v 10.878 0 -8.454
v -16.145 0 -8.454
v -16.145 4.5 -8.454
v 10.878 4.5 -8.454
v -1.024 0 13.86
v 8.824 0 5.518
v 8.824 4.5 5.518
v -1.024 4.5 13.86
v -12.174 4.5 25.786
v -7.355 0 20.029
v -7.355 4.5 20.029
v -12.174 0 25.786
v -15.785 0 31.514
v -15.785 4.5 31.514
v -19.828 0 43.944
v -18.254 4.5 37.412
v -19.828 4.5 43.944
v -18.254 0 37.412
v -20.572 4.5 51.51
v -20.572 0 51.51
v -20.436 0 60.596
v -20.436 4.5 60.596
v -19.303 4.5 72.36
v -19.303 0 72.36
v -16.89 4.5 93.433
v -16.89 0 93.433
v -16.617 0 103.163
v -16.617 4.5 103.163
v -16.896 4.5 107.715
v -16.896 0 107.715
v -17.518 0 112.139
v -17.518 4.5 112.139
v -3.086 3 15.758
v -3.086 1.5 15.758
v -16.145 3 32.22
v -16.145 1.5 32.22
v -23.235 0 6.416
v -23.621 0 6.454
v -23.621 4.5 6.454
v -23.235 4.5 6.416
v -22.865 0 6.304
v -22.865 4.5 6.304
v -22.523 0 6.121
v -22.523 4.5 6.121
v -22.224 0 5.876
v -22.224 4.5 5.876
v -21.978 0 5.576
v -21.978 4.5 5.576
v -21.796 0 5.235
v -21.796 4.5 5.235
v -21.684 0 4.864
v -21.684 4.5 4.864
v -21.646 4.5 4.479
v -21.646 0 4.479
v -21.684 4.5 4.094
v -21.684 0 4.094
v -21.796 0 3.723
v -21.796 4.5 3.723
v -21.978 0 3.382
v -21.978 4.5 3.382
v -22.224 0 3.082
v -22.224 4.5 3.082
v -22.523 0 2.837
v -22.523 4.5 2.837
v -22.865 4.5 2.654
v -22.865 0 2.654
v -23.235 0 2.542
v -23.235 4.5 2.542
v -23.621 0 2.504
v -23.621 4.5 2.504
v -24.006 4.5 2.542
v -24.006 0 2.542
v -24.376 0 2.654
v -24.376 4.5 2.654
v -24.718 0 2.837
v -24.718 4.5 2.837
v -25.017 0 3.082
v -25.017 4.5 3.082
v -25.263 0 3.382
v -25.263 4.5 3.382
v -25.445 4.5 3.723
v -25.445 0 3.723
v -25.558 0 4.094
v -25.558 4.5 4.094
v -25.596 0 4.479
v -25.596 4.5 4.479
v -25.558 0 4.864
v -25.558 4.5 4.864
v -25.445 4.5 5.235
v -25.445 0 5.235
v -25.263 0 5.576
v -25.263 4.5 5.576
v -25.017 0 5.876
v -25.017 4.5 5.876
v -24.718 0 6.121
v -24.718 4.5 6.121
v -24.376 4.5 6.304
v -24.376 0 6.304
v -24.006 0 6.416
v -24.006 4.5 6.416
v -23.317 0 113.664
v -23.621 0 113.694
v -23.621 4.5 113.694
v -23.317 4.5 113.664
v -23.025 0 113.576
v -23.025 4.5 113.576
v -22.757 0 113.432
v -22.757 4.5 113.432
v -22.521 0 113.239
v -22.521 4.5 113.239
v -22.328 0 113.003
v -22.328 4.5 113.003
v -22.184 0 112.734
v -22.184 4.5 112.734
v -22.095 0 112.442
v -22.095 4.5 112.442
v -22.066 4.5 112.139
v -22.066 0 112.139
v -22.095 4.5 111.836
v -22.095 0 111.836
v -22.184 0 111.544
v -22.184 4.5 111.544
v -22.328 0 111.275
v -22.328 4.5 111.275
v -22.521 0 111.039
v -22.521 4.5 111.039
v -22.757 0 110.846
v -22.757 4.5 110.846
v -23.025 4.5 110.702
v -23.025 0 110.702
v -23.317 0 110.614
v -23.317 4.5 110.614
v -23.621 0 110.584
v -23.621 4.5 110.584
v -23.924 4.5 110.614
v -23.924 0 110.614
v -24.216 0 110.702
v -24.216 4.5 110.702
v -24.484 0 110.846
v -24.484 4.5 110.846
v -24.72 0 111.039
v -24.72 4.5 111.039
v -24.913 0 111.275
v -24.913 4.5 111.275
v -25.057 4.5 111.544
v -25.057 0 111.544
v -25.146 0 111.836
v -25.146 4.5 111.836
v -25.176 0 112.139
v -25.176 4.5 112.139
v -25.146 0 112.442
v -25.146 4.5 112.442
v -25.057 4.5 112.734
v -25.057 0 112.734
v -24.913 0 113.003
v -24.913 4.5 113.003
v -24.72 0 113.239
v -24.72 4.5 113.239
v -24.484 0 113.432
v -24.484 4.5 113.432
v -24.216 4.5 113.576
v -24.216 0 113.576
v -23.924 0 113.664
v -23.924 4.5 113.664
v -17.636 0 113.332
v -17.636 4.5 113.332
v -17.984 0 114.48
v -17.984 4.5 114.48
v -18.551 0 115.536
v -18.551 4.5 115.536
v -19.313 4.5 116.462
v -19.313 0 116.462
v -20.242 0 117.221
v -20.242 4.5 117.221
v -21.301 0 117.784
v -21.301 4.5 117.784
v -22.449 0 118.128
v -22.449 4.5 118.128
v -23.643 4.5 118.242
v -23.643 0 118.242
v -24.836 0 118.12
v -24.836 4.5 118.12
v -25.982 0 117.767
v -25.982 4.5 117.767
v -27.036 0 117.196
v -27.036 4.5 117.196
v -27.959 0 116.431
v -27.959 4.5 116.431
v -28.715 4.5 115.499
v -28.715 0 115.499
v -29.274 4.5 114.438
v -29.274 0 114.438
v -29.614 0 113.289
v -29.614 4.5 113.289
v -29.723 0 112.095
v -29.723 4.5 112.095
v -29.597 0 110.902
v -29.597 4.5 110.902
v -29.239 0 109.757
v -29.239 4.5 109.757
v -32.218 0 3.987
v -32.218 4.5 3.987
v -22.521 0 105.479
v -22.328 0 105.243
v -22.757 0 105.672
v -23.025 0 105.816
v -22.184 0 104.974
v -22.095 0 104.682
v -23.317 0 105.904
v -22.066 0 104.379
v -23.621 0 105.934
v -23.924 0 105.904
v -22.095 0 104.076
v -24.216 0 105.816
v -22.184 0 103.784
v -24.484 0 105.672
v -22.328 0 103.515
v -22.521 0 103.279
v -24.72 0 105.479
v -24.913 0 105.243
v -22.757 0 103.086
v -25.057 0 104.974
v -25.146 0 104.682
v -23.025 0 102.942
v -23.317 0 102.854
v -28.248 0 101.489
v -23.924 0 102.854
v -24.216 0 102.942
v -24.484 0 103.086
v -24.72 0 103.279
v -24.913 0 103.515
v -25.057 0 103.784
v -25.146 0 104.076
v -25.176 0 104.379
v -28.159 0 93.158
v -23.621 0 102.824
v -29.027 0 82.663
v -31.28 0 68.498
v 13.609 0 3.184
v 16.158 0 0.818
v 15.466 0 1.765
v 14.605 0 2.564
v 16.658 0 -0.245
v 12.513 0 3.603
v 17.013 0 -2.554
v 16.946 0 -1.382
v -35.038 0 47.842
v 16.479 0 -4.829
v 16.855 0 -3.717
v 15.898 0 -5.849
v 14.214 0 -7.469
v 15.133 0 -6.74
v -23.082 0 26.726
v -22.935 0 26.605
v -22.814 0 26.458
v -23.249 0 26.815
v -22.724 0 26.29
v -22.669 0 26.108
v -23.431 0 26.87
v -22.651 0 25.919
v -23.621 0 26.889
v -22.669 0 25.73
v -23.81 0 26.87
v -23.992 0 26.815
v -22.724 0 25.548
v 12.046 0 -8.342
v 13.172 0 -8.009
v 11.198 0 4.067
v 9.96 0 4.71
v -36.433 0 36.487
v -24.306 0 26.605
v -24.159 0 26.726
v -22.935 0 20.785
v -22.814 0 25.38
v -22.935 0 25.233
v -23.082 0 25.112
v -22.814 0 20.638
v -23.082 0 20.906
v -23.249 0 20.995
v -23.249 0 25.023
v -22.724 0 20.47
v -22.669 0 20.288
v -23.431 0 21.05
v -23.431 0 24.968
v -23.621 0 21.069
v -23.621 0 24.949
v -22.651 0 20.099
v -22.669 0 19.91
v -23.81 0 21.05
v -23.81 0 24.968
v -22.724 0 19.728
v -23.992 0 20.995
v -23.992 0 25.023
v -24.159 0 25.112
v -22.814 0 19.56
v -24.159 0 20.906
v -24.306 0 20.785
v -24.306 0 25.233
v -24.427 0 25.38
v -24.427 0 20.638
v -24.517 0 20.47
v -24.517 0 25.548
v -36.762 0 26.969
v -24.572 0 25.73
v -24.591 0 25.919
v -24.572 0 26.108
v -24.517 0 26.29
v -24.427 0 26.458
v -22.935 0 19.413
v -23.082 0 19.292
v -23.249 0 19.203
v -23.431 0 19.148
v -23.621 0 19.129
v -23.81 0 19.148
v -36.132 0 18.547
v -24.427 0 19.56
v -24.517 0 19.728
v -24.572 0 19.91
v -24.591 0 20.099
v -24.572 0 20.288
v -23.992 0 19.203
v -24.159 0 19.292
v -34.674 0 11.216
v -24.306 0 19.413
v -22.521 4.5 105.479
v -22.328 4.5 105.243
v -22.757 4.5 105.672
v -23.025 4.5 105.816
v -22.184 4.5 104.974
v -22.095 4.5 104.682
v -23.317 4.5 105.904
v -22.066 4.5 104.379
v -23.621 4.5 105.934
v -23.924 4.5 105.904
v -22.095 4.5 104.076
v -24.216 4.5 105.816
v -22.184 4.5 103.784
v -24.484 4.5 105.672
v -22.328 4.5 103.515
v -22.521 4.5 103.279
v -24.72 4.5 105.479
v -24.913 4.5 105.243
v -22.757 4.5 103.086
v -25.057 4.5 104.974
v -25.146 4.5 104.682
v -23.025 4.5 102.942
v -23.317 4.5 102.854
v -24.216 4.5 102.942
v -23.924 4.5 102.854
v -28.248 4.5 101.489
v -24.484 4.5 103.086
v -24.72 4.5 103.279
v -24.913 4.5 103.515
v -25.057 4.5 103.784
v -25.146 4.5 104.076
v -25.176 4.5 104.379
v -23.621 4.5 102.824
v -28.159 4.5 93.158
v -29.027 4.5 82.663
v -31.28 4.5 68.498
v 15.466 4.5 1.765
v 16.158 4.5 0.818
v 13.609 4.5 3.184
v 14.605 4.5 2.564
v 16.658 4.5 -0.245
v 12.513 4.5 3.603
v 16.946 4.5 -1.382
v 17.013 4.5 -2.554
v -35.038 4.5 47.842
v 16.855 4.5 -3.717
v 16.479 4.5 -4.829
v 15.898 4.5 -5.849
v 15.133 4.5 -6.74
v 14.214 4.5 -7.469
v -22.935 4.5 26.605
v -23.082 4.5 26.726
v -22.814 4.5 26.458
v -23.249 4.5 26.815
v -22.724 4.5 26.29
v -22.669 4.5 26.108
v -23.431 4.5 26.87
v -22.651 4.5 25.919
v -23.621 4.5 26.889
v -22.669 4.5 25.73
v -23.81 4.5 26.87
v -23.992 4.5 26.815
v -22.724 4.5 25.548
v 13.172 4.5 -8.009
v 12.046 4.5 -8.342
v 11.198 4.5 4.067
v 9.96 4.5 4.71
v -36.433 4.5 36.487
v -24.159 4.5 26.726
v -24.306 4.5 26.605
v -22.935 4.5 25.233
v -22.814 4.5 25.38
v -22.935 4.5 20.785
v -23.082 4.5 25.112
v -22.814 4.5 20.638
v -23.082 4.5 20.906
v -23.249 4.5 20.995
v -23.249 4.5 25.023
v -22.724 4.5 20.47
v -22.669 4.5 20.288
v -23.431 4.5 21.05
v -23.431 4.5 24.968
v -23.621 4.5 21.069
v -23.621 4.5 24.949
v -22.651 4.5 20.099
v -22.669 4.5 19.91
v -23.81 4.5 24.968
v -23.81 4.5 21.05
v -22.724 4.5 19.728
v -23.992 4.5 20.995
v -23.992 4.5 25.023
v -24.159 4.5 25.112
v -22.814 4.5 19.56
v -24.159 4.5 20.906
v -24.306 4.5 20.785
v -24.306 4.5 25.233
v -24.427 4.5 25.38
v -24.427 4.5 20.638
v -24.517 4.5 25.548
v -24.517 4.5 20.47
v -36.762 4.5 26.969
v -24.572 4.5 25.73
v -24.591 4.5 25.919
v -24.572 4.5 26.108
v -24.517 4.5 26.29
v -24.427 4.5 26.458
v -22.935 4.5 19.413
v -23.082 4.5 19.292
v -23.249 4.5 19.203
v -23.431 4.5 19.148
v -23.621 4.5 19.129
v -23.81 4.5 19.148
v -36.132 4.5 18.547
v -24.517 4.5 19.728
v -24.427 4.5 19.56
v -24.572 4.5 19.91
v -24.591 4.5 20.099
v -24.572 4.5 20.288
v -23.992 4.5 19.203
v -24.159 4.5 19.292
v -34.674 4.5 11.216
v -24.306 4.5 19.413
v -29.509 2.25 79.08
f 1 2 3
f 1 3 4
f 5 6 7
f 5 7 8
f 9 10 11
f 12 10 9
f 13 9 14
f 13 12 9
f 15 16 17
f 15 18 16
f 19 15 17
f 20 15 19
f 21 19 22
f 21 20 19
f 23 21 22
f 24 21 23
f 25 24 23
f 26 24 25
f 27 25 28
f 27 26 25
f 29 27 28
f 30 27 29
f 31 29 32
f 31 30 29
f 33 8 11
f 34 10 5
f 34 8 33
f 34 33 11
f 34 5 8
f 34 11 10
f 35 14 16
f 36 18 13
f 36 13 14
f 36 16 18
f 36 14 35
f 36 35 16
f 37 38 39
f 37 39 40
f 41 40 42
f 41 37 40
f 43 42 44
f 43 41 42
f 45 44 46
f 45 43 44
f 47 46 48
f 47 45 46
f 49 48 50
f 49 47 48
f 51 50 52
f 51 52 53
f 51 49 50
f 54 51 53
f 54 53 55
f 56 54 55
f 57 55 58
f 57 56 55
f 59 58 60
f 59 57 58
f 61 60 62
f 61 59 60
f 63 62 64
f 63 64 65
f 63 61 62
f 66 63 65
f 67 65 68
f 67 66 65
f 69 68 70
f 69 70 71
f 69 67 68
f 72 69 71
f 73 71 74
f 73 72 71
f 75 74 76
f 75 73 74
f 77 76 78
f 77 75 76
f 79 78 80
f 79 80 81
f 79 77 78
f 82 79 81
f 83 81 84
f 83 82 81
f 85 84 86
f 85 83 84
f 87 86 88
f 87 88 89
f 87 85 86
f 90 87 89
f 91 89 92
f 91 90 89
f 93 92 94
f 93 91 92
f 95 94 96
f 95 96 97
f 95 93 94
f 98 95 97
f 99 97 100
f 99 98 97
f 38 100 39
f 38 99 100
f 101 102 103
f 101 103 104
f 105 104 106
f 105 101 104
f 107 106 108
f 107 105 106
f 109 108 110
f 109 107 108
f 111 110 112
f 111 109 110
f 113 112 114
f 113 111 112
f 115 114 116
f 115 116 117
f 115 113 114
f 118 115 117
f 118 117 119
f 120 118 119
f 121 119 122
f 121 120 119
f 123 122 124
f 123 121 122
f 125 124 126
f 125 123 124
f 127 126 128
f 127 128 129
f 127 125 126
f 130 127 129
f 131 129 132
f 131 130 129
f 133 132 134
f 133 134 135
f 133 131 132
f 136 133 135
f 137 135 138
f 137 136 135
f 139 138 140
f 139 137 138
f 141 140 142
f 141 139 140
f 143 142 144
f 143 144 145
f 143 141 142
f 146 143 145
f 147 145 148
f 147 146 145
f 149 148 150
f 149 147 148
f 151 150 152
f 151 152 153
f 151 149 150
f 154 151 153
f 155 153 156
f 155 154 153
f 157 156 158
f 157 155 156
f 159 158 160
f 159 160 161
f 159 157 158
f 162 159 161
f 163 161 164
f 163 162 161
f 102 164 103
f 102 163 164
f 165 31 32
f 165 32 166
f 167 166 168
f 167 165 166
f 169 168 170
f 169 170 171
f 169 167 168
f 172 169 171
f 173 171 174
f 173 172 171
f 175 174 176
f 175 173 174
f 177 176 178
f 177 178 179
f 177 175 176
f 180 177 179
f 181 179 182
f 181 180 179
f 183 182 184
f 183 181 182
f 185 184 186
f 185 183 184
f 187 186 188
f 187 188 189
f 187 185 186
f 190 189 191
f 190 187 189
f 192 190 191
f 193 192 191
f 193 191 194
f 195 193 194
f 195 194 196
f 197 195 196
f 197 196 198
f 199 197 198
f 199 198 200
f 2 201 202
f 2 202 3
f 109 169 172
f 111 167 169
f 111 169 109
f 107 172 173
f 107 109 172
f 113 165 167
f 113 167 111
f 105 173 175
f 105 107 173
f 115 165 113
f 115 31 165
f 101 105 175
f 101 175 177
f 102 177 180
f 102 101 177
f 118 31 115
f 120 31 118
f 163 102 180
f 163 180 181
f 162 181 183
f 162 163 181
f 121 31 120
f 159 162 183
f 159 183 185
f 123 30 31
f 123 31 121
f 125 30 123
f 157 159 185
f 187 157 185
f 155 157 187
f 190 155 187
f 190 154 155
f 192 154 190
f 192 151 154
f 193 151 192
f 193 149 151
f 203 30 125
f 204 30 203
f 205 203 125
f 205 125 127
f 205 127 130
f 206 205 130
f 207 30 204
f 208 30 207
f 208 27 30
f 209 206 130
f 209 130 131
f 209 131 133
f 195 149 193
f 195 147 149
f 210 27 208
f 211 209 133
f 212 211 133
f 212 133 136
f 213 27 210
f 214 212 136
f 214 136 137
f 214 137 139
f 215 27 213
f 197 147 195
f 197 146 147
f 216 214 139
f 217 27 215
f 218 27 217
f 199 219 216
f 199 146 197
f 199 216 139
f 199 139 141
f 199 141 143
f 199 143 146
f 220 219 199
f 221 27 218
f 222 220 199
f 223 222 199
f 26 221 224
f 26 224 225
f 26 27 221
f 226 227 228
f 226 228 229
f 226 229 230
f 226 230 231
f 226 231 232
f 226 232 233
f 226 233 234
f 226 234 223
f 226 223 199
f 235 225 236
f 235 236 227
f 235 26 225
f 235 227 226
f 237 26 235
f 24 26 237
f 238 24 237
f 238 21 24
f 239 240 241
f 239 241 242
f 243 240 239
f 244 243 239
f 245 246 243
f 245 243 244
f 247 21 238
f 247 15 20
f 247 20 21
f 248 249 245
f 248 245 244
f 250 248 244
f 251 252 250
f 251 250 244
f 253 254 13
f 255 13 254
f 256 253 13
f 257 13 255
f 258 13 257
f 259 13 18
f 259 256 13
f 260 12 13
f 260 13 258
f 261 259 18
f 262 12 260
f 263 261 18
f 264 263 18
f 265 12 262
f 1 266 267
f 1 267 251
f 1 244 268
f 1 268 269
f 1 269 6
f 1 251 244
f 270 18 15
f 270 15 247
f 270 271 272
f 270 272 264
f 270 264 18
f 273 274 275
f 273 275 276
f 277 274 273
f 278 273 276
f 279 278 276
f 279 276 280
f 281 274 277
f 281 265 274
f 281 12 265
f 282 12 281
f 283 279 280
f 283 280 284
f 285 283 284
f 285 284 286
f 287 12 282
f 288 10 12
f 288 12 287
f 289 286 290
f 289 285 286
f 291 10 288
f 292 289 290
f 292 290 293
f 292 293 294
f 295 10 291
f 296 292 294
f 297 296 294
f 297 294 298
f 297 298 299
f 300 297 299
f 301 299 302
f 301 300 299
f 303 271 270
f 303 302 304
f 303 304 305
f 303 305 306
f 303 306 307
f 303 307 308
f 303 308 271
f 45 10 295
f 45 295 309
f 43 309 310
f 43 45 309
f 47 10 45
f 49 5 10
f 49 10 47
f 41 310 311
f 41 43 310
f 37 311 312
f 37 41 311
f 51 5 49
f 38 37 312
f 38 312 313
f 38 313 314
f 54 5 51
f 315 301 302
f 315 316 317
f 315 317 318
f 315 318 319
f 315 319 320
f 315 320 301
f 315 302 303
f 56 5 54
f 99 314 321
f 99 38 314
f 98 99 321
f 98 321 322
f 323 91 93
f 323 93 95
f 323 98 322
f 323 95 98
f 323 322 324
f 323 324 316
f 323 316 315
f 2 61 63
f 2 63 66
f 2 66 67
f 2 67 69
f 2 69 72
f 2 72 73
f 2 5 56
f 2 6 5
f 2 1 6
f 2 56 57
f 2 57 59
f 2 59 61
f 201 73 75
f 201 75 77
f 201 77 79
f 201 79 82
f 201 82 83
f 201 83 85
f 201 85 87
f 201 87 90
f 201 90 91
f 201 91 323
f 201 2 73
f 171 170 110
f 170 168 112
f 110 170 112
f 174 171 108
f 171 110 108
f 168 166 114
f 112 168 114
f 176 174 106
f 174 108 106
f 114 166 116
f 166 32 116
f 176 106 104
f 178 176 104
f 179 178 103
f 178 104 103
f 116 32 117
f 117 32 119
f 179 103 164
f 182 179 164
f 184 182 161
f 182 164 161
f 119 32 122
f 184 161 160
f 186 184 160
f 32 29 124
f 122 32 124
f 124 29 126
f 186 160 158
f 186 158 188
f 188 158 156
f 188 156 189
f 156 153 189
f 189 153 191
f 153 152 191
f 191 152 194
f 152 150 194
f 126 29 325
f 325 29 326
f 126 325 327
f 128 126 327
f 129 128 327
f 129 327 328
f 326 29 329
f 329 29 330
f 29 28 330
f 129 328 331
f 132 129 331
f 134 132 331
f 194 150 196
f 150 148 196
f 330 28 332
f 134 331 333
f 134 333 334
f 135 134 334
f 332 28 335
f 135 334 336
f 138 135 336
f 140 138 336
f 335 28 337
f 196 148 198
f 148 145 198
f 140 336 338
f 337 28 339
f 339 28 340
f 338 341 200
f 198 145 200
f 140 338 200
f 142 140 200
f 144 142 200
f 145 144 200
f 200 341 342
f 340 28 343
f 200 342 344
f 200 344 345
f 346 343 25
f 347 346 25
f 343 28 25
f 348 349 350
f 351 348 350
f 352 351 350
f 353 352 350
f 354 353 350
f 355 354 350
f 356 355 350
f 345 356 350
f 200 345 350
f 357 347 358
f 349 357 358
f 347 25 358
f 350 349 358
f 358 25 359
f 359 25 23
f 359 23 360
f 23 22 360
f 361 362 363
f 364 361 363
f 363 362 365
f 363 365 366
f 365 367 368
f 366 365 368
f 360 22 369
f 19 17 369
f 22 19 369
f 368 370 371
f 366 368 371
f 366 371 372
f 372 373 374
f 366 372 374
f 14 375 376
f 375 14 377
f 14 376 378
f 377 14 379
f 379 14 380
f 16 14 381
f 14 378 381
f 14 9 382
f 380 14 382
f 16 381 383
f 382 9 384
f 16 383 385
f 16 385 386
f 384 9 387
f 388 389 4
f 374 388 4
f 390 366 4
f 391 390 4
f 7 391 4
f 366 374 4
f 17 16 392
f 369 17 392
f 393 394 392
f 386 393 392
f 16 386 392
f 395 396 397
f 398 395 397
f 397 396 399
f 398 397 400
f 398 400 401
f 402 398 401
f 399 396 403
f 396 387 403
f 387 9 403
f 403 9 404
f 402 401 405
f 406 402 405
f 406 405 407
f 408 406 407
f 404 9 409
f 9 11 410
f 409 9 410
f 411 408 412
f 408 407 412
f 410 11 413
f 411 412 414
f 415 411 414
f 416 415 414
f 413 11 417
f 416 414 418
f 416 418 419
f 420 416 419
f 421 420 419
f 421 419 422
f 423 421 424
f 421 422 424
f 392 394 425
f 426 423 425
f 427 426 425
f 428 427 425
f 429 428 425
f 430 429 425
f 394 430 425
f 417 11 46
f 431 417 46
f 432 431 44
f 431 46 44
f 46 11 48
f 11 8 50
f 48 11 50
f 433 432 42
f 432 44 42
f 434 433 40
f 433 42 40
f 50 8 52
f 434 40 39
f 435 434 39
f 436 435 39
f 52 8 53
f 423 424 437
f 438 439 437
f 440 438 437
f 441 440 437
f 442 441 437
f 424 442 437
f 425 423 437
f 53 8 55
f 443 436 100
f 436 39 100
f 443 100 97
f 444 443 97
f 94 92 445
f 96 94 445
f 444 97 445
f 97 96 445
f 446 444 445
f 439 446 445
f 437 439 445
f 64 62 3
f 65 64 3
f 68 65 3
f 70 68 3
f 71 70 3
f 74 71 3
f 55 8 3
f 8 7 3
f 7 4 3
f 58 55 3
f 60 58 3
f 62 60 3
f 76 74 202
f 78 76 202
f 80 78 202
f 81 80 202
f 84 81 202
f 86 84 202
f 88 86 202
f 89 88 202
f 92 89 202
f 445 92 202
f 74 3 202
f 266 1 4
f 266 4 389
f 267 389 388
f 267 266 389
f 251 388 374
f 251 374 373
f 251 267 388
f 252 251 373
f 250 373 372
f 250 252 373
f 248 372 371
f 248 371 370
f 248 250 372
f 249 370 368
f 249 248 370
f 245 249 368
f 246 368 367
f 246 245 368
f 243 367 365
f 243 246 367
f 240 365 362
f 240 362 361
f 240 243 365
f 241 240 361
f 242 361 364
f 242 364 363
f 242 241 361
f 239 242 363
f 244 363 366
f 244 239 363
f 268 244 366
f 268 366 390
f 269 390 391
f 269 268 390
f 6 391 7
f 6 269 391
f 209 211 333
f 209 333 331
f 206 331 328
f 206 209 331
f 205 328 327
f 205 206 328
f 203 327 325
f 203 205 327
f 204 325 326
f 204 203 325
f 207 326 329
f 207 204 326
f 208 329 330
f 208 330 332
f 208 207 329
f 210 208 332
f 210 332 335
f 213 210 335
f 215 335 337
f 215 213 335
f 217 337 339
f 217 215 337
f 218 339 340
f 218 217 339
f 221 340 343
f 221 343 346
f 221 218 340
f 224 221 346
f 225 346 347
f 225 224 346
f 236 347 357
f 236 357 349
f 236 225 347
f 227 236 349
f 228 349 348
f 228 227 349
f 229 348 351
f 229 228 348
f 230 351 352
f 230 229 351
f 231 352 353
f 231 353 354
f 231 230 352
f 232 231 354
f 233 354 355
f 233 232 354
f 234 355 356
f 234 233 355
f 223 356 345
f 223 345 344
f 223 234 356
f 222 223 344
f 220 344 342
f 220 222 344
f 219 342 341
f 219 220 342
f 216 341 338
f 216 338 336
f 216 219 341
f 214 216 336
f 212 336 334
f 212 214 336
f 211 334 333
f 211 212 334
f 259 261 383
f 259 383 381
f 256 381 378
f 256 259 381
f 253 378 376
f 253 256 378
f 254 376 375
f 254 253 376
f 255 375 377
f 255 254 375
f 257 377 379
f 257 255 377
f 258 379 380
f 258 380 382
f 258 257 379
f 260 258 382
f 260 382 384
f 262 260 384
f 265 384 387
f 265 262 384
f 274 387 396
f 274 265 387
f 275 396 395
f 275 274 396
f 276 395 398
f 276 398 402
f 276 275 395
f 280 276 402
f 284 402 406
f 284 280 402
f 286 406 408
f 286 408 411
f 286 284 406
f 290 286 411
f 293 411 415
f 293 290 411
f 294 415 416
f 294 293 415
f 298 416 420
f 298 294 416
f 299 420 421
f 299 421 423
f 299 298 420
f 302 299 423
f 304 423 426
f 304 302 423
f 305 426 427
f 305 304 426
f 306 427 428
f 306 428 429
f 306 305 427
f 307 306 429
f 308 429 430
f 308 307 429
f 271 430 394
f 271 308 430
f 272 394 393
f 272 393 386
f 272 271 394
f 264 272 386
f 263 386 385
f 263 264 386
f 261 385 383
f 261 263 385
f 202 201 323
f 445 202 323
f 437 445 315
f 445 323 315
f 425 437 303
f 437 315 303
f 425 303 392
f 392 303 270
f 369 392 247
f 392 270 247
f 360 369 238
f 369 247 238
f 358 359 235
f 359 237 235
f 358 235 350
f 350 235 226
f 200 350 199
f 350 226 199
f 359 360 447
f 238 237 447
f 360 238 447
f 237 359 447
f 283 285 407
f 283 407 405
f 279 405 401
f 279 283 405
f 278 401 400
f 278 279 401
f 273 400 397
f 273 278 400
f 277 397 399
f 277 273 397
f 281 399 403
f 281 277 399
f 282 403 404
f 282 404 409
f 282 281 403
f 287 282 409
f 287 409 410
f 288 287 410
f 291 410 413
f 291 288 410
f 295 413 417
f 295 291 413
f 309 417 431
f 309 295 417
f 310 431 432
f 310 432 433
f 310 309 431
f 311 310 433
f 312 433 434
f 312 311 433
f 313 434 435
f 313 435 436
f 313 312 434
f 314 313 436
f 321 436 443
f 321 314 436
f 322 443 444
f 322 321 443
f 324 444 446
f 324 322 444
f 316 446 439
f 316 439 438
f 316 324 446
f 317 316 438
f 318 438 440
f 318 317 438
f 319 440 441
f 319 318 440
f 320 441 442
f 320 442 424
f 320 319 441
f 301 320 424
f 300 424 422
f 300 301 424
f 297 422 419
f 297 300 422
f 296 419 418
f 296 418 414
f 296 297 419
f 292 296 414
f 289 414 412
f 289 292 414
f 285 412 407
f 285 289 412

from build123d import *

# Parameters (mm, degrees)
SKETCH1_R           = 1.975
SKETCH1_R_2         = 1.554999938
SKETCH1_R_3         = 0.97
BOSS_EXTRUDE1_DEPTH = 4.5


with BuildPart() as part:
    # Sketch1 → Boss-Extrude1 (new body)
    with BuildSketch(Plane(origin=(0, 0, 0), x_dir=(1, 0, 0), z_dir=(0, 1, 0))):
        with BuildLine():
            Line((-16.144899663, 8.454003274), (10.877745108, 8.454003274))
            ThreePointArc((10.877745108, 8.454003274), (16.961539544, 3.139522495), (12.51277209, -3.603231306))
            ThreePointArc((12.51277209, -3.603231306), (10.56783567, -4.367093581), (8.824099884, -5.518461795))
            add(Edge.make_bspline(
                [(8.824099884, -5.518461795), (4.932532744, -8.718832913), (-4.696045283, -16.58586855), (-31.489086781, -46.943790059), (-12.894682963, -87.326546642), (-17.517744483, -112.138995974)],
                knots=[0.023478108, 0.023478108, 0.023478108, 0.023478108, 0.154944007, 0.330832674, 1, 1, 1, 1], degree=3))
            ThreePointArc((-17.517744483, -112.138995974), (-24.835663445, -118.119615453), (-29.239494185, -109.757437382))
            add(Edge.make_bspline(
                [(-32.217521916, -3.987452131), (-42.206514906, -27.827820505), (-29.561370115, -63.982250345), (-27.390169054, -99.665041987), (-29.239494185, -109.757437382)],
                knots=[0, 0, 0, 0, 0.696305279, 0.977824201, 0.977824201, 0.977824201, 0.977824201], degree=3))
            Line((-32.217521916, -3.987452131), (-16.144899663, 8.454003274))
        make_face()
        with Locations(Location((-23.620555115, -4.478995902, 0), (0, 0, 270))):
            Circle(SKETCH1_R, mode=Mode.SUBTRACT)
        with Locations(Location((-23.620555115, -112.138995974, 0), (0, 0, 270))):
            Circle(SKETCH1_R_2, mode=Mode.SUBTRACT)
        with Locations(Location((-23.620555115, -104.378996, 0), (0, 0, 270))):
            Circle(SKETCH1_R_2, mode=Mode.SUBTRACT)
        with Locations(Location((-23.620555115, -25.918995902, 0), (0, 0, 270))):
            Circle(SKETCH1_R_3, mode=Mode.SUBTRACT)
        with Locations(Location((-23.620555115, -20.098995902, 0), (0, 0, 270))):
            Circle(SKETCH1_R_3, mode=Mode.SUBTRACT)
    extrude(amount=BOSS_EXTRUDE1_DEPTH)


solid = part.part
